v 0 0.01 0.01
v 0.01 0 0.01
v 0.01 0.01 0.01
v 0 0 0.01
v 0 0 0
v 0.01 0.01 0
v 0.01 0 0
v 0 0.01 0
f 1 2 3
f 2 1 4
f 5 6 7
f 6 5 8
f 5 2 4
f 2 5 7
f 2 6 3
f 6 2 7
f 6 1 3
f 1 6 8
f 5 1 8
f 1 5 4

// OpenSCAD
/***
 * @function mate_motion_direct_cases
 * @brief Direct conjugate-mate construction regression.
 * Source: [`mate/motion/direct_cases.scad`](mate/motion/direct_cases.scad)
 *
 * The mate points are generated from driver-angle samples and the integrated
 * rolling increments.  No inverse motion-table lookup is involved.
 */
include <../../../src/common/mate/motion.scad>
include <../../../src/common/curve_gears_math.scad>
include <../../../src/common/mate/placement.scad>

n=240;
driver=[for(i=[0:n-1]) 10+2*cos(360*i/n)];
mid=[for(i=[0:n-1]) 10+2*cos(360*(i+.5)/n)];
D=_cg_solve_mate_distance(mid,12.01,40);
mate=_cg_mate_points_from_radius_samples(driver,mid,D);
motion=_cg_motion_table_from_radius_samples(driver,mid,D);
diagnostics=_cg_mate_pitch_diagnostics(driver,mid,D,mate);

assert(abs(motion[len(motion)-1][1]-360)<1e-6,"direct mate closure failed");
assert(min([for(i=[0:n-1]) abs(driver[i]+_cg_vlen(mate[i])-D)])<1e-6,"mate radii were not derived from D-driver radius");
assert(diagnostics[11][1],"direct mate diagnostics rejected a valid pitch curve");
assert(len(mate)==n,"direct mate sample count changed");

cube([.01,.01,.01]);
